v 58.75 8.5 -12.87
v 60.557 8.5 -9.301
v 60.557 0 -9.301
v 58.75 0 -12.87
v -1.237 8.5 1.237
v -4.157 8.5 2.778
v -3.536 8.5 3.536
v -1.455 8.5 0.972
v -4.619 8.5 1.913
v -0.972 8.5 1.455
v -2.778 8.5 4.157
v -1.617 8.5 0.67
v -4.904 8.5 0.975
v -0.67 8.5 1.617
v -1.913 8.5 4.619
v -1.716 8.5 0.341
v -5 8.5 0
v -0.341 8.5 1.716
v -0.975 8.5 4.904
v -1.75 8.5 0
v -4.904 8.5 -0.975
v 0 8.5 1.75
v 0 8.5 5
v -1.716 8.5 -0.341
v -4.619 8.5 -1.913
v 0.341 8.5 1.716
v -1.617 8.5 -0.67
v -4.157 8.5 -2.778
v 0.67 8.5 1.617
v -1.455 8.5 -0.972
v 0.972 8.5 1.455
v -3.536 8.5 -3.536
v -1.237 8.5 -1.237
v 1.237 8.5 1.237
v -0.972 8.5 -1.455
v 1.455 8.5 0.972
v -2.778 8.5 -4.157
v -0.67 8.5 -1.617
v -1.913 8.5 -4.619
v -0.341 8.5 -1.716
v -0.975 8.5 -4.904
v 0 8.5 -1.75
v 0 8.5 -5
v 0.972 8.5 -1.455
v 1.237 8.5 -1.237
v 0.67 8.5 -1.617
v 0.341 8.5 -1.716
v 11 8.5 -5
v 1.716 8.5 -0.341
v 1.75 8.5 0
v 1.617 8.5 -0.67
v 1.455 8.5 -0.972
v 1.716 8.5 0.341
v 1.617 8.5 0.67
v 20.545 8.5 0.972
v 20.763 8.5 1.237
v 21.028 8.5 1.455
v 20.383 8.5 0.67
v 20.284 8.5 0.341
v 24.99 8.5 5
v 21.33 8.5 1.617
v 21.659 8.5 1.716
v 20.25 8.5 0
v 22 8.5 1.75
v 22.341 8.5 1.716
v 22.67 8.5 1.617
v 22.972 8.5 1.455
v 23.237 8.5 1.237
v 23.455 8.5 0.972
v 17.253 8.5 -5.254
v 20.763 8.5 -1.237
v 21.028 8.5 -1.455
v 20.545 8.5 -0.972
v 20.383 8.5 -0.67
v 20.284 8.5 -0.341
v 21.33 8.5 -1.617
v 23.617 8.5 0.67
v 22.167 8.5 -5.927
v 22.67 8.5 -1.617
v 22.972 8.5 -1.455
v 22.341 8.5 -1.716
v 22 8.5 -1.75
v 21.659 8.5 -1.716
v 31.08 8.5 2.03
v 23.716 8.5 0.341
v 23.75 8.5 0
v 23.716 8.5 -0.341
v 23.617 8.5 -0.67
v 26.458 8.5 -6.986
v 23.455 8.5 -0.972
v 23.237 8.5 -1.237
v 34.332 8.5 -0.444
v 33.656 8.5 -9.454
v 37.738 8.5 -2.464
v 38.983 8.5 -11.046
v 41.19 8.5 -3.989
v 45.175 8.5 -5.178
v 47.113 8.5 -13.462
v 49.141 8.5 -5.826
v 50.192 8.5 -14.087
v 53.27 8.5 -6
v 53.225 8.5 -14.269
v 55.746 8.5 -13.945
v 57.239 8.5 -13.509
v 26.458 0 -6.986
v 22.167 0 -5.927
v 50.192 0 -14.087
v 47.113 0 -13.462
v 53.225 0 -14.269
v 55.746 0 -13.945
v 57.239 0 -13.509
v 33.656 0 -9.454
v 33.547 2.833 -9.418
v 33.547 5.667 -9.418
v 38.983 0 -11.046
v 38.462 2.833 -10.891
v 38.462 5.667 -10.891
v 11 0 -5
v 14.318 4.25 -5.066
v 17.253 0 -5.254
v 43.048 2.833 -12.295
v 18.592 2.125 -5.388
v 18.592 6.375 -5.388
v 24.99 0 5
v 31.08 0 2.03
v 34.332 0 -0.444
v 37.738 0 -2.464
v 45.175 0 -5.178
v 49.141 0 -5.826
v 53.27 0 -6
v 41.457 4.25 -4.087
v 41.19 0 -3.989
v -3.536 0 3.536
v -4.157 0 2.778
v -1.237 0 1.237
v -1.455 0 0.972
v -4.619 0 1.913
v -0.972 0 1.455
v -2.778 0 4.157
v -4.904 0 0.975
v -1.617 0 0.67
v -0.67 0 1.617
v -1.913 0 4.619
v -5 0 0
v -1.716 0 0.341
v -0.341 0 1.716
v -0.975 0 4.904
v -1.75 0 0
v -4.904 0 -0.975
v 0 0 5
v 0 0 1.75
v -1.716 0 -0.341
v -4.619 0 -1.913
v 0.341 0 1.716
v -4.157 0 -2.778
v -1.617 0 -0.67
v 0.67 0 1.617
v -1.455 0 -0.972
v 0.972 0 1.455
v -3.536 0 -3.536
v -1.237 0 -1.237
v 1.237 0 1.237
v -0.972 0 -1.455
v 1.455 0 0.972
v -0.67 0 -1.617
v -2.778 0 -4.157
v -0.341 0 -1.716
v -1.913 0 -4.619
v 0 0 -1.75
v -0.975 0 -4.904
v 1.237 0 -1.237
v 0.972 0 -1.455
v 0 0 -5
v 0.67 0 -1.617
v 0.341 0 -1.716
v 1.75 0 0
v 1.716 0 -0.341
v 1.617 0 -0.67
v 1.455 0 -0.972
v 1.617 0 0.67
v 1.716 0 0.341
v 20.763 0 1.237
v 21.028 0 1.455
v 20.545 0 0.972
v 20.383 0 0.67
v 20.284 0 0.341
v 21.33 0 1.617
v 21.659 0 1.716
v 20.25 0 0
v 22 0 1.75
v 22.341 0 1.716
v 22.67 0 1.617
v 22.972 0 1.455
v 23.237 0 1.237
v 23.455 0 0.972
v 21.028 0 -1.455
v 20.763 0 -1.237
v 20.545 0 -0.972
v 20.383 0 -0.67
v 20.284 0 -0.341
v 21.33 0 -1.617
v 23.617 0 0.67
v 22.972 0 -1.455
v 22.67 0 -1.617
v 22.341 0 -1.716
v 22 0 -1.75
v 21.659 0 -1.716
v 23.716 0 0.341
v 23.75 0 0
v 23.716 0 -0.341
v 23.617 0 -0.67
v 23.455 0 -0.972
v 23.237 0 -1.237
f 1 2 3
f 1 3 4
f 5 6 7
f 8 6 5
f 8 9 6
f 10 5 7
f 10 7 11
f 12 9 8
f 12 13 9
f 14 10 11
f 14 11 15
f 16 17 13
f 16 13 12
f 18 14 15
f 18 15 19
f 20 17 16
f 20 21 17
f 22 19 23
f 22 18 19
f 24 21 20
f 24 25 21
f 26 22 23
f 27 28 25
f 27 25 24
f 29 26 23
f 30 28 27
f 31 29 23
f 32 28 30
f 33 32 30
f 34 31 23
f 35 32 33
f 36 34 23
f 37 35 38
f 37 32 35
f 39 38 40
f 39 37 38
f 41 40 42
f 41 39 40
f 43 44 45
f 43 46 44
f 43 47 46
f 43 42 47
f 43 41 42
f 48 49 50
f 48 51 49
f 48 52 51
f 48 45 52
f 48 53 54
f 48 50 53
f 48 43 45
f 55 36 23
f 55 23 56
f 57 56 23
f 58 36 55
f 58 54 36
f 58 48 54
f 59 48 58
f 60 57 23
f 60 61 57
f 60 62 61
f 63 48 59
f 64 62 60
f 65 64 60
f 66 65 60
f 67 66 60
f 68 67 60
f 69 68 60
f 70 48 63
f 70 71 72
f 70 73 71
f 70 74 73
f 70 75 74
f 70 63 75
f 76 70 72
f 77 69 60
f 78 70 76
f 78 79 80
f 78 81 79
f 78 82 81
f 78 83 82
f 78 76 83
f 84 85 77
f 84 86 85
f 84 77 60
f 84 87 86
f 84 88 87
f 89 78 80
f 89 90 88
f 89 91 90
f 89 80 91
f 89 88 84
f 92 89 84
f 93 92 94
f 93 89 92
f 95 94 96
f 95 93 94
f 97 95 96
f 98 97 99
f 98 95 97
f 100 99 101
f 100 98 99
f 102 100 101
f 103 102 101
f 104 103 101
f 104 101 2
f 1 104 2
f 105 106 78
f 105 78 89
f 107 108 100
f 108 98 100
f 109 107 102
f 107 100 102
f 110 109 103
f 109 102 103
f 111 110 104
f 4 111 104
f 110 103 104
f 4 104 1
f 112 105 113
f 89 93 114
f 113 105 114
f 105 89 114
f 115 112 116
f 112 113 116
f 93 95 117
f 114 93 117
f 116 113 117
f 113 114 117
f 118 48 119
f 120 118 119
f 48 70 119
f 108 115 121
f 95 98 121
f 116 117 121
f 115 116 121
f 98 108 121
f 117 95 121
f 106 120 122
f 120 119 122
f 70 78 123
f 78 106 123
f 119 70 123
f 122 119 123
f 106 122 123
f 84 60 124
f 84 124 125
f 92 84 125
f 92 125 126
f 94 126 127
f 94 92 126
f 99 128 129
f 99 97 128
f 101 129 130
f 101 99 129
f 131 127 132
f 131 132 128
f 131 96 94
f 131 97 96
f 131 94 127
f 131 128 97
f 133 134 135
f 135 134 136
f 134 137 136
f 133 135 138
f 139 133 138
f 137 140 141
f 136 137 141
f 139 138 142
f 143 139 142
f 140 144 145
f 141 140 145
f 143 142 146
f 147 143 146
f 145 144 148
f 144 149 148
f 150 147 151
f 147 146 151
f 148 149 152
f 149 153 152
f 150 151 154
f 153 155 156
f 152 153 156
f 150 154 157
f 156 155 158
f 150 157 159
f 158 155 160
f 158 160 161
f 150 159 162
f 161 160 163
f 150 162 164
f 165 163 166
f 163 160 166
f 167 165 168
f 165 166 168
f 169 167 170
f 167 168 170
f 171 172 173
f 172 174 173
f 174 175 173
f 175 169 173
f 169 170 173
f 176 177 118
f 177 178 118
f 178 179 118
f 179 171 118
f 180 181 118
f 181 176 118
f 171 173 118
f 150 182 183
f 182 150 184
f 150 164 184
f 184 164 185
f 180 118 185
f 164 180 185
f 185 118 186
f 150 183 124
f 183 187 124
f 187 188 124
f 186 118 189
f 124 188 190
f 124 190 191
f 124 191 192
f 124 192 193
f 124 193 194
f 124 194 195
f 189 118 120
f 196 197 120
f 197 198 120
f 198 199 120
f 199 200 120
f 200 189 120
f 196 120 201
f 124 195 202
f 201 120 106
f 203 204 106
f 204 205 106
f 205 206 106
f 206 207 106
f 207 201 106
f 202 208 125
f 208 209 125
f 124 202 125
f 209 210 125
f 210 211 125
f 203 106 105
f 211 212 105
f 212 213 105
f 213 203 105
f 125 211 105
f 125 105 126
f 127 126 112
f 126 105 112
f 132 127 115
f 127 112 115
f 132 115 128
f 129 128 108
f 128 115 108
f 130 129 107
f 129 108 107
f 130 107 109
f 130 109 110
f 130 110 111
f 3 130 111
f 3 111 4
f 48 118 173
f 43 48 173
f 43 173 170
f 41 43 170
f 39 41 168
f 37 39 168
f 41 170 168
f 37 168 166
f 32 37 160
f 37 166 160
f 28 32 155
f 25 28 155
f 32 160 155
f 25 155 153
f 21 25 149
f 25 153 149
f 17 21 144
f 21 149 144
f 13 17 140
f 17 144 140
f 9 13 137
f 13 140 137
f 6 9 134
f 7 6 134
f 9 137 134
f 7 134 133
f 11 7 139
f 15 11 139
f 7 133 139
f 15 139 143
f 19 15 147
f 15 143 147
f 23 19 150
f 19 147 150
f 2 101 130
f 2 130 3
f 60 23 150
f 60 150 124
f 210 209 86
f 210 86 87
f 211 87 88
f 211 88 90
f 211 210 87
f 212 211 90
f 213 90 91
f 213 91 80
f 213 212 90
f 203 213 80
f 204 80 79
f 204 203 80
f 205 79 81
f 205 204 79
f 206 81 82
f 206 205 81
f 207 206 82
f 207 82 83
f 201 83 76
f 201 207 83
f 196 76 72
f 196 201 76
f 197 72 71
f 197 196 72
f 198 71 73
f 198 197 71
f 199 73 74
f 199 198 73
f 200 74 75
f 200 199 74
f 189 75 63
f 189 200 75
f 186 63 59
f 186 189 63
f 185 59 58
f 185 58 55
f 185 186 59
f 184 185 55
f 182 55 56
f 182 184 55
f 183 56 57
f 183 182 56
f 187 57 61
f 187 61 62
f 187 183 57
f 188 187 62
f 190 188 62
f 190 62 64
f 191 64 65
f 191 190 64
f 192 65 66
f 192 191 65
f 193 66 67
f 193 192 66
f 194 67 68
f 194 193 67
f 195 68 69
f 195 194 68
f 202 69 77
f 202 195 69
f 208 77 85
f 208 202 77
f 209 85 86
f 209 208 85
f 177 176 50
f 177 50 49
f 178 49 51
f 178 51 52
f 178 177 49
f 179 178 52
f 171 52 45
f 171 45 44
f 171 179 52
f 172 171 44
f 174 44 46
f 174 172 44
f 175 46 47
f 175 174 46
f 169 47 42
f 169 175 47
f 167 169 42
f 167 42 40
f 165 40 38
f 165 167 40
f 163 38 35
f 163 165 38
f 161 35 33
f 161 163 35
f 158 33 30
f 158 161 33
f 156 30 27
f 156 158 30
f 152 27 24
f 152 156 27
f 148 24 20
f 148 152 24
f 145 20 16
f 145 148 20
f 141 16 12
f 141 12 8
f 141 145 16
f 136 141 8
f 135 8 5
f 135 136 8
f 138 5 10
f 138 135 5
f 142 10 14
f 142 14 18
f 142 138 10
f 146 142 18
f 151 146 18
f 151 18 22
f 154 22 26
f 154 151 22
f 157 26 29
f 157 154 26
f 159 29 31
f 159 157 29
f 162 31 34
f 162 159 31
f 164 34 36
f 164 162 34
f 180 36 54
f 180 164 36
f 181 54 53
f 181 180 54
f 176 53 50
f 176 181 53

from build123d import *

# Parameters (mm, degrees)
SKETCH2_R           = 5
SKETCH2_R_2         = 1.75
BOSS_EXTRUDE1_DEPTH = 8.5
BOSS_EXTRUDE2_DEPTH = 8.5


with BuildPart() as part:
    # Sketch2 → Boss-Extrude1 (new body)
    with BuildSketch(Plane(origin=(0, 0, 0), x_dir=(1, 0, 0), z_dir=(0, 1, 0))):
        with BuildLine():
            ThreePointArc((22, -5), (17, 0), (22, 5))
            Line((22, 5), (2e-09, 5))
            ThreePointArc((2e-09, 5), (3.535533907, 3.535533905), (5, 0))
            ThreePointArc((5, 0), (3.535533908, -3.535533904), (7e-09, -5))
            Line((7e-09, -5), (22, -5))
        make_face()
        Circle(SKETCH2_R)
        Circle(SKETCH2_R_2, mode=Mode.SUBTRACT)
        with Locations((22, 0)):
            Circle(SKETCH2_R)
        with Locations((22, 0)):
            Circle(SKETCH2_R_2, mode=Mode.SUBTRACT)
    extrude(amount=BOSS_EXTRUDE1_DEPTH)

    # Sketch3 → Boss-Extrude2 (add)
    with BuildSketch(Plane(origin=(0, 8.5, 0), x_dir=(1, 0, 0), z_dir=(0, 1, 0))):
        with BuildLine():
            Line((22, -5), (24.99, -5))
            Line((24.99, -5), (31.08, -2.029708536))
            add(Edge.make_bspline(
                [(31.08, -2.029708536), (40.738723452, 6.188270814), (53.27, 6)],
                knots=[0, 0, 0, 1, 1, 1], degree=2))
            Line((53.27, 6), (60.557013712, 9.301428655))
            Line((60.557013712, 9.301428655), (58.75, 12.87))
            add(Edge.make_bspline(
                [(11, 5), (23.320985194, 5), (28.960367737, 8.21999158), (46.060199439, 12.976683932), (52.533262276, 15.918311154), (58.75, 12.87)],
                knots=[0, 0, 0, 0, 0.362024874, 0.462024874, 1, 1, 1, 1], degree=3))
            Line((11, 5), (22, 5))
            ThreePointArc((22, 5), (27, 0), (22, -5))
        make_face()
    extrude(amount=-BOSS_EXTRUDE2_DEPTH)


solid = part.part
